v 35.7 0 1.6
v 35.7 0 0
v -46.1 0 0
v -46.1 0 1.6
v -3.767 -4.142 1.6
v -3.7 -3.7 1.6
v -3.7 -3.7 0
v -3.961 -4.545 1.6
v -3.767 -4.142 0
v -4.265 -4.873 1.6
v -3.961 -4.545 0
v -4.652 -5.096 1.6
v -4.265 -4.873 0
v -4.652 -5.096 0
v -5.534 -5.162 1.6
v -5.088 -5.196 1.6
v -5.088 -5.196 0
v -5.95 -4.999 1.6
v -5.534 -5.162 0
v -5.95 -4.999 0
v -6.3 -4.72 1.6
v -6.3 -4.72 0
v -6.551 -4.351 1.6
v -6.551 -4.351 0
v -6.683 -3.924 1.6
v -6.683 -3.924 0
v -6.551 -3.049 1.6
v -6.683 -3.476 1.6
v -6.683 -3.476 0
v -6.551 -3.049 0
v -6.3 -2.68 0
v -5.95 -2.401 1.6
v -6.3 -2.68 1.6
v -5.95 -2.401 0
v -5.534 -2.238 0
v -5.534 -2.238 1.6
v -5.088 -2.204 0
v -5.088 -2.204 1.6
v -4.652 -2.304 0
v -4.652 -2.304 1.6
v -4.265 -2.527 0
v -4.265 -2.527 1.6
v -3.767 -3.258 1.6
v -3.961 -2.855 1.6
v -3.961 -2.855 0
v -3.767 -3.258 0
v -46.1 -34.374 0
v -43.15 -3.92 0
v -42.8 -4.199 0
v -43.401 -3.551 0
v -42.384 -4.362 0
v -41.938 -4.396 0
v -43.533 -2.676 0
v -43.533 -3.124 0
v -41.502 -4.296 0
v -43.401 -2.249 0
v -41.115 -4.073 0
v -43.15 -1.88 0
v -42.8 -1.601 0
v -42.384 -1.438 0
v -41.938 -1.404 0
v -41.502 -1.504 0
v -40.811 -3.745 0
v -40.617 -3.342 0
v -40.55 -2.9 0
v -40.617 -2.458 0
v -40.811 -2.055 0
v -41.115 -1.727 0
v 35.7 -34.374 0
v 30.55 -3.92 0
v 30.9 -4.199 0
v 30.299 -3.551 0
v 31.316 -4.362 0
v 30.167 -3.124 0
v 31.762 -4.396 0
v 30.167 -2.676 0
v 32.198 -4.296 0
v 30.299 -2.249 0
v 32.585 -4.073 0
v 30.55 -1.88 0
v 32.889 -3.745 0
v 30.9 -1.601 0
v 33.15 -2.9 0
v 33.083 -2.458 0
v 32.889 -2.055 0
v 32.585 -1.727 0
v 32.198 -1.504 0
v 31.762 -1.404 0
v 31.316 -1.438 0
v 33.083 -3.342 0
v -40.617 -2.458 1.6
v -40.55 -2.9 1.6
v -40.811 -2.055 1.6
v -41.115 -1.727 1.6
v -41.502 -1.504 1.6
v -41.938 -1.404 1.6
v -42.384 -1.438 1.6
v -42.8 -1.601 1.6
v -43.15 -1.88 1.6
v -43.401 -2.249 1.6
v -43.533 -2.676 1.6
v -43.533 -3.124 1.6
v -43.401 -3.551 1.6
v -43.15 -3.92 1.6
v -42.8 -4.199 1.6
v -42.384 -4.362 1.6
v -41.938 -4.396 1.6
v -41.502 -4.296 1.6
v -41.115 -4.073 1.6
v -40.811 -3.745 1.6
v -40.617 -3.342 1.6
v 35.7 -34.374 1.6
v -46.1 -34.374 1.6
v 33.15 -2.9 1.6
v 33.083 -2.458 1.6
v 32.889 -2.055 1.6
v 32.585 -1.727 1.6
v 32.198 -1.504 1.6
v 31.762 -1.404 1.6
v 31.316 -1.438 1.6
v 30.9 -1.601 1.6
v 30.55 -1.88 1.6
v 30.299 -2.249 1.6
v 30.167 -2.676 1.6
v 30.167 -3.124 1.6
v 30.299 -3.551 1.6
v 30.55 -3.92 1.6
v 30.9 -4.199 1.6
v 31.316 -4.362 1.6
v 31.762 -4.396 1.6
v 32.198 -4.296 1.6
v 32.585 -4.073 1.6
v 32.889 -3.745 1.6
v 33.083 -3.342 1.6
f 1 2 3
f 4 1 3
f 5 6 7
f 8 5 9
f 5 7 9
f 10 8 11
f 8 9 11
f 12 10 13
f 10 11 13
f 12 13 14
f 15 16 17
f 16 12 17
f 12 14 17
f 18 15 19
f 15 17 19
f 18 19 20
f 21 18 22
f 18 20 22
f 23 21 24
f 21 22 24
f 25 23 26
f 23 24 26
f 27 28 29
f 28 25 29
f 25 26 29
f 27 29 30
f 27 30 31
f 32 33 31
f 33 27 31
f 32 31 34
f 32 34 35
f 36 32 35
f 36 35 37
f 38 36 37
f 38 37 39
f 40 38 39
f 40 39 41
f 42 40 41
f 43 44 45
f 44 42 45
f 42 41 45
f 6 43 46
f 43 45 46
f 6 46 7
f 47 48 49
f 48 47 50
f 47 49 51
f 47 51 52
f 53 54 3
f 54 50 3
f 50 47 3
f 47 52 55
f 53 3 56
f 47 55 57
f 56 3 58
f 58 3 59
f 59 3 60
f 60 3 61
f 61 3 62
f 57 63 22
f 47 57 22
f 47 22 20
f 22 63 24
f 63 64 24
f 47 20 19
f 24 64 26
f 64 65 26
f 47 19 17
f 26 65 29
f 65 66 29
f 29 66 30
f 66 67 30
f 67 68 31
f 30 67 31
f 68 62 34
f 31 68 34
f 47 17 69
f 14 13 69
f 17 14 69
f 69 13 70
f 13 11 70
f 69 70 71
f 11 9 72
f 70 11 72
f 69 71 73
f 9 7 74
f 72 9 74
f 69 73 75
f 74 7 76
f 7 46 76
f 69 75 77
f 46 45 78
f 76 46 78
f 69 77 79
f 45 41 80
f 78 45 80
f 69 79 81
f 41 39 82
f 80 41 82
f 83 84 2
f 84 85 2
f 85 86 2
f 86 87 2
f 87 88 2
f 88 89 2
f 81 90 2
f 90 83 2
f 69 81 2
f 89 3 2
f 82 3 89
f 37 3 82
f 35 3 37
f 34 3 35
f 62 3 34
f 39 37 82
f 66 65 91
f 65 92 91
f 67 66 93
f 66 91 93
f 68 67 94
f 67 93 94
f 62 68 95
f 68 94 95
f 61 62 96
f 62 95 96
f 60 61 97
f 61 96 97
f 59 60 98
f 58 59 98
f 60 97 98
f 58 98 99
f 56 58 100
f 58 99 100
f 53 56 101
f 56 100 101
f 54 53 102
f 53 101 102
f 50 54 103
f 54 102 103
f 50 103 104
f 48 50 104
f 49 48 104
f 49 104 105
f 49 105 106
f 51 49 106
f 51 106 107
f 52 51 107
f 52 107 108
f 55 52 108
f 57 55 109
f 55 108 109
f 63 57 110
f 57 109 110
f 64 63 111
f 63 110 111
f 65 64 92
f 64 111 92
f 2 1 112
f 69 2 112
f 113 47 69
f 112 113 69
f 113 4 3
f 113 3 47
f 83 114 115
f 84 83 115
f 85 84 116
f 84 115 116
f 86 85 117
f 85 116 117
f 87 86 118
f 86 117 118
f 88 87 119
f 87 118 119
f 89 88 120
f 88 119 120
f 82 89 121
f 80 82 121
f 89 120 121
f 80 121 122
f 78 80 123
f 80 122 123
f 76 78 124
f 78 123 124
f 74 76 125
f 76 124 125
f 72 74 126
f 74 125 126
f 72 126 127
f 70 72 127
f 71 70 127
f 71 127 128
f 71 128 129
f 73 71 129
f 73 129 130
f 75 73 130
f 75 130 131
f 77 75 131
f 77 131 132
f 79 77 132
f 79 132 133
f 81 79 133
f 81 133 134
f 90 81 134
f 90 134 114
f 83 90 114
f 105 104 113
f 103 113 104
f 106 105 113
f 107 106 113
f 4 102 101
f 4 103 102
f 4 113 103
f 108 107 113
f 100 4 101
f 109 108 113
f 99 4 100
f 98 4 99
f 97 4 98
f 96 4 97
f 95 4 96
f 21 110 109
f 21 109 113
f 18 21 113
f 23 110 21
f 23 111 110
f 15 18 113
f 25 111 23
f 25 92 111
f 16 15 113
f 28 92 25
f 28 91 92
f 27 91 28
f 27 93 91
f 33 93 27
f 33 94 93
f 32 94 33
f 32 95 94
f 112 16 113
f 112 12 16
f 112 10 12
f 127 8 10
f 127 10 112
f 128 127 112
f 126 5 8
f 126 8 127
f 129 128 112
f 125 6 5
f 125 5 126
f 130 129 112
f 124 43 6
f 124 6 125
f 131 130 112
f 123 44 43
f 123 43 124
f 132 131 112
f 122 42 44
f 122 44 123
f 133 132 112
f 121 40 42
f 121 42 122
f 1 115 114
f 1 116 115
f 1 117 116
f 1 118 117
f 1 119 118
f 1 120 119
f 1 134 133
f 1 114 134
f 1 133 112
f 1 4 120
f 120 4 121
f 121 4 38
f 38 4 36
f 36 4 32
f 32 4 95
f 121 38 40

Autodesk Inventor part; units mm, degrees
ref_plane "YZ Plane" through (0, 0, 0) normal (1, 0, 0) x (0, 1, 0)
ref_plane "XZ Plane" through (0, 0, 0) normal (0, 1, 0) x (-1, 0, 0)
ref_plane "XY Plane" through (0, 0, 0) normal (0, 0, 1) x (1, 0, 0)
sketch "Szkic1" plane through (0, 0, 0) normal (0, 0, 1) x (1, 0, 0)
  circle A0 centre (-5.2, -2.45) radius 1.5 projected
  line L0 (-10.4, 2.5) -> (0, 2.5) projected
  line L1 (-10.4, 2.5) -> (-10.4, -7.4) projected
  line L2 (-10.4, -7.4) -> (0, -7.4) projected
  line L3 (0, 2.5) -> (0, -7.4) projected
  line L4 (-47.2, 2.5) -> (36.8, 2.5) projected
  line L5 (-47.2, -36.8743) -> (-47.2, 14.8735) projected
  line L6 (36.8, -36.8743) -> (36.8, 14.8735) projected
  line L7 (-47.2, 2.5) -> (36.8, 2.5)
  line L8 (36.8, 2.5) -> (36.8, -36.8743)
  line L9 (36.8, -36.8743) -> (-47.2, -36.8743)
  line L10 (-47.2, -36.8743) -> (-47.2, 2.5)
  line L11 (-44.7, -34.3743) -> (34.3, -34.3743)
  line L12 (34.3, -34.3743) -> (34.3, 0)
  line L13 (34.3, 0) -> (-44.7, 0)
  line L14 (-44.7, 0) -> (-44.7, -34.3743)
  line L15 (-5.2, 0) -> (-5.2, -7.4)
  circle A1 centre (-5.2, -3.7) radius 1.5
  point P0 (0, 0)
  dimension "d0" = 2.5
extrude "Wyciągnięcie proste1" add sketch "Szkic1" along normal blind 1.6 contours A0 A1 L15 | A0 L15 L13 L3 L2 A1 | L15 A1 A0 | A0 A1 L15 L2 L1 L13 | L13 L12 L11 L14 L1 L2 L3 picked at (-4.9756, -1.8088) picked at (-5.4233, -1.8086)
sketch "Szkic2" plane through (0, 0, 1.6) normal (0, 0, 1) x (1, 0, 0)
  circle A0 centre (-42.05, -2.9) radius 1.5 projected
  circle A1 centre (31.65, -2.9) radius 1.5 projected
  point P0 (0, 0)
extrude "Wyciągnięcie proste2" cut sketch "Szkic2" against normal through all
sketch "Szkic3" plane through (0, 0, 1.6) normal (0, 0, 1) x (1, 0, 0)
  circle A0 centre (31.65, -2.9) radius 1.5 projected
  circle A1 centre (-42.05, -2.9) radius 1.5 projected
  line L0 (-44.7, 0) -> (-44.7, -34.3743) projected
  line L1 (-44.7, -34.3743) -> (34.3, -34.3743) projected
  line L2 (34.3, -34.3743) -> (34.3, 0) projected
  line L3 (34.3, 0) -> (-44.7, 0) projected
  circle A2 centre (-5.2, -3.7) radius 1.5 projected
  line L4 (-44.7, 0) -> (-44.7, -34.3743) projected
  line L5 (34.3, 0) -> (-44.7, 0) projected
  line L6 (-44.7, -34.3743) -> (34.3, -34.3743)
  line L7 (34.3, -34.3743) -> (34.3, 0)
  line L8 (34.3, 0) -> (-44.7, 0)
  line L9 (-44.7, 0) -> (-44.7, -34.3743)
  line L10 (-46.1, 0) -> (-46.1, -34.3743)
  line L11 (35.7, 0) -> (35.7, -35.7743)
  line L12 (35.7, -35.7743) -> (-44.7, -35.7743)
  line L13 (-46.1, -34.3743) -> (35.7, -34.3743)
  line L14 (-44.7, -34.3743) -> (34.3, -34.3743) projected
  line L15 (-46.1, 0) -> (35.7, 0)
  point P0 (0, 0)
  dimension "d5" = 1.4
  dimension "d6" = 1.4
extrude "Wyciągnięcie proste3" add sketch "Szkic3" against normal up to surface (1.6 mm away) contours L0 L13 L10 L15 | L15 L11 L13 L2
sketch "Szkic5" plane through (0, 0, 1.6) normal (0, 0, 1) x (1, 0, 0)
  circle A0 centre (31.65, -2.9) radius 1.5 projected
  circle A1 centre (-42.05, -2.9) radius 1.5 projected
  line L0 (-46.1, -34.3743) -> (35.7, -34.3743) projected
  line L1 (35.7, -34.3743) -> (35.7, 0) projected
  line L2 (35.7, 0) -> (-46.1, 0) projected
  line L3 (-46.1, 0) -> (-46.1, -34.3743) projected
  circle A2 centre (-5.2, -3.7) radius 1.5 projected
  point P0 (0, 0)
properties part number "PCBE_2_2"
